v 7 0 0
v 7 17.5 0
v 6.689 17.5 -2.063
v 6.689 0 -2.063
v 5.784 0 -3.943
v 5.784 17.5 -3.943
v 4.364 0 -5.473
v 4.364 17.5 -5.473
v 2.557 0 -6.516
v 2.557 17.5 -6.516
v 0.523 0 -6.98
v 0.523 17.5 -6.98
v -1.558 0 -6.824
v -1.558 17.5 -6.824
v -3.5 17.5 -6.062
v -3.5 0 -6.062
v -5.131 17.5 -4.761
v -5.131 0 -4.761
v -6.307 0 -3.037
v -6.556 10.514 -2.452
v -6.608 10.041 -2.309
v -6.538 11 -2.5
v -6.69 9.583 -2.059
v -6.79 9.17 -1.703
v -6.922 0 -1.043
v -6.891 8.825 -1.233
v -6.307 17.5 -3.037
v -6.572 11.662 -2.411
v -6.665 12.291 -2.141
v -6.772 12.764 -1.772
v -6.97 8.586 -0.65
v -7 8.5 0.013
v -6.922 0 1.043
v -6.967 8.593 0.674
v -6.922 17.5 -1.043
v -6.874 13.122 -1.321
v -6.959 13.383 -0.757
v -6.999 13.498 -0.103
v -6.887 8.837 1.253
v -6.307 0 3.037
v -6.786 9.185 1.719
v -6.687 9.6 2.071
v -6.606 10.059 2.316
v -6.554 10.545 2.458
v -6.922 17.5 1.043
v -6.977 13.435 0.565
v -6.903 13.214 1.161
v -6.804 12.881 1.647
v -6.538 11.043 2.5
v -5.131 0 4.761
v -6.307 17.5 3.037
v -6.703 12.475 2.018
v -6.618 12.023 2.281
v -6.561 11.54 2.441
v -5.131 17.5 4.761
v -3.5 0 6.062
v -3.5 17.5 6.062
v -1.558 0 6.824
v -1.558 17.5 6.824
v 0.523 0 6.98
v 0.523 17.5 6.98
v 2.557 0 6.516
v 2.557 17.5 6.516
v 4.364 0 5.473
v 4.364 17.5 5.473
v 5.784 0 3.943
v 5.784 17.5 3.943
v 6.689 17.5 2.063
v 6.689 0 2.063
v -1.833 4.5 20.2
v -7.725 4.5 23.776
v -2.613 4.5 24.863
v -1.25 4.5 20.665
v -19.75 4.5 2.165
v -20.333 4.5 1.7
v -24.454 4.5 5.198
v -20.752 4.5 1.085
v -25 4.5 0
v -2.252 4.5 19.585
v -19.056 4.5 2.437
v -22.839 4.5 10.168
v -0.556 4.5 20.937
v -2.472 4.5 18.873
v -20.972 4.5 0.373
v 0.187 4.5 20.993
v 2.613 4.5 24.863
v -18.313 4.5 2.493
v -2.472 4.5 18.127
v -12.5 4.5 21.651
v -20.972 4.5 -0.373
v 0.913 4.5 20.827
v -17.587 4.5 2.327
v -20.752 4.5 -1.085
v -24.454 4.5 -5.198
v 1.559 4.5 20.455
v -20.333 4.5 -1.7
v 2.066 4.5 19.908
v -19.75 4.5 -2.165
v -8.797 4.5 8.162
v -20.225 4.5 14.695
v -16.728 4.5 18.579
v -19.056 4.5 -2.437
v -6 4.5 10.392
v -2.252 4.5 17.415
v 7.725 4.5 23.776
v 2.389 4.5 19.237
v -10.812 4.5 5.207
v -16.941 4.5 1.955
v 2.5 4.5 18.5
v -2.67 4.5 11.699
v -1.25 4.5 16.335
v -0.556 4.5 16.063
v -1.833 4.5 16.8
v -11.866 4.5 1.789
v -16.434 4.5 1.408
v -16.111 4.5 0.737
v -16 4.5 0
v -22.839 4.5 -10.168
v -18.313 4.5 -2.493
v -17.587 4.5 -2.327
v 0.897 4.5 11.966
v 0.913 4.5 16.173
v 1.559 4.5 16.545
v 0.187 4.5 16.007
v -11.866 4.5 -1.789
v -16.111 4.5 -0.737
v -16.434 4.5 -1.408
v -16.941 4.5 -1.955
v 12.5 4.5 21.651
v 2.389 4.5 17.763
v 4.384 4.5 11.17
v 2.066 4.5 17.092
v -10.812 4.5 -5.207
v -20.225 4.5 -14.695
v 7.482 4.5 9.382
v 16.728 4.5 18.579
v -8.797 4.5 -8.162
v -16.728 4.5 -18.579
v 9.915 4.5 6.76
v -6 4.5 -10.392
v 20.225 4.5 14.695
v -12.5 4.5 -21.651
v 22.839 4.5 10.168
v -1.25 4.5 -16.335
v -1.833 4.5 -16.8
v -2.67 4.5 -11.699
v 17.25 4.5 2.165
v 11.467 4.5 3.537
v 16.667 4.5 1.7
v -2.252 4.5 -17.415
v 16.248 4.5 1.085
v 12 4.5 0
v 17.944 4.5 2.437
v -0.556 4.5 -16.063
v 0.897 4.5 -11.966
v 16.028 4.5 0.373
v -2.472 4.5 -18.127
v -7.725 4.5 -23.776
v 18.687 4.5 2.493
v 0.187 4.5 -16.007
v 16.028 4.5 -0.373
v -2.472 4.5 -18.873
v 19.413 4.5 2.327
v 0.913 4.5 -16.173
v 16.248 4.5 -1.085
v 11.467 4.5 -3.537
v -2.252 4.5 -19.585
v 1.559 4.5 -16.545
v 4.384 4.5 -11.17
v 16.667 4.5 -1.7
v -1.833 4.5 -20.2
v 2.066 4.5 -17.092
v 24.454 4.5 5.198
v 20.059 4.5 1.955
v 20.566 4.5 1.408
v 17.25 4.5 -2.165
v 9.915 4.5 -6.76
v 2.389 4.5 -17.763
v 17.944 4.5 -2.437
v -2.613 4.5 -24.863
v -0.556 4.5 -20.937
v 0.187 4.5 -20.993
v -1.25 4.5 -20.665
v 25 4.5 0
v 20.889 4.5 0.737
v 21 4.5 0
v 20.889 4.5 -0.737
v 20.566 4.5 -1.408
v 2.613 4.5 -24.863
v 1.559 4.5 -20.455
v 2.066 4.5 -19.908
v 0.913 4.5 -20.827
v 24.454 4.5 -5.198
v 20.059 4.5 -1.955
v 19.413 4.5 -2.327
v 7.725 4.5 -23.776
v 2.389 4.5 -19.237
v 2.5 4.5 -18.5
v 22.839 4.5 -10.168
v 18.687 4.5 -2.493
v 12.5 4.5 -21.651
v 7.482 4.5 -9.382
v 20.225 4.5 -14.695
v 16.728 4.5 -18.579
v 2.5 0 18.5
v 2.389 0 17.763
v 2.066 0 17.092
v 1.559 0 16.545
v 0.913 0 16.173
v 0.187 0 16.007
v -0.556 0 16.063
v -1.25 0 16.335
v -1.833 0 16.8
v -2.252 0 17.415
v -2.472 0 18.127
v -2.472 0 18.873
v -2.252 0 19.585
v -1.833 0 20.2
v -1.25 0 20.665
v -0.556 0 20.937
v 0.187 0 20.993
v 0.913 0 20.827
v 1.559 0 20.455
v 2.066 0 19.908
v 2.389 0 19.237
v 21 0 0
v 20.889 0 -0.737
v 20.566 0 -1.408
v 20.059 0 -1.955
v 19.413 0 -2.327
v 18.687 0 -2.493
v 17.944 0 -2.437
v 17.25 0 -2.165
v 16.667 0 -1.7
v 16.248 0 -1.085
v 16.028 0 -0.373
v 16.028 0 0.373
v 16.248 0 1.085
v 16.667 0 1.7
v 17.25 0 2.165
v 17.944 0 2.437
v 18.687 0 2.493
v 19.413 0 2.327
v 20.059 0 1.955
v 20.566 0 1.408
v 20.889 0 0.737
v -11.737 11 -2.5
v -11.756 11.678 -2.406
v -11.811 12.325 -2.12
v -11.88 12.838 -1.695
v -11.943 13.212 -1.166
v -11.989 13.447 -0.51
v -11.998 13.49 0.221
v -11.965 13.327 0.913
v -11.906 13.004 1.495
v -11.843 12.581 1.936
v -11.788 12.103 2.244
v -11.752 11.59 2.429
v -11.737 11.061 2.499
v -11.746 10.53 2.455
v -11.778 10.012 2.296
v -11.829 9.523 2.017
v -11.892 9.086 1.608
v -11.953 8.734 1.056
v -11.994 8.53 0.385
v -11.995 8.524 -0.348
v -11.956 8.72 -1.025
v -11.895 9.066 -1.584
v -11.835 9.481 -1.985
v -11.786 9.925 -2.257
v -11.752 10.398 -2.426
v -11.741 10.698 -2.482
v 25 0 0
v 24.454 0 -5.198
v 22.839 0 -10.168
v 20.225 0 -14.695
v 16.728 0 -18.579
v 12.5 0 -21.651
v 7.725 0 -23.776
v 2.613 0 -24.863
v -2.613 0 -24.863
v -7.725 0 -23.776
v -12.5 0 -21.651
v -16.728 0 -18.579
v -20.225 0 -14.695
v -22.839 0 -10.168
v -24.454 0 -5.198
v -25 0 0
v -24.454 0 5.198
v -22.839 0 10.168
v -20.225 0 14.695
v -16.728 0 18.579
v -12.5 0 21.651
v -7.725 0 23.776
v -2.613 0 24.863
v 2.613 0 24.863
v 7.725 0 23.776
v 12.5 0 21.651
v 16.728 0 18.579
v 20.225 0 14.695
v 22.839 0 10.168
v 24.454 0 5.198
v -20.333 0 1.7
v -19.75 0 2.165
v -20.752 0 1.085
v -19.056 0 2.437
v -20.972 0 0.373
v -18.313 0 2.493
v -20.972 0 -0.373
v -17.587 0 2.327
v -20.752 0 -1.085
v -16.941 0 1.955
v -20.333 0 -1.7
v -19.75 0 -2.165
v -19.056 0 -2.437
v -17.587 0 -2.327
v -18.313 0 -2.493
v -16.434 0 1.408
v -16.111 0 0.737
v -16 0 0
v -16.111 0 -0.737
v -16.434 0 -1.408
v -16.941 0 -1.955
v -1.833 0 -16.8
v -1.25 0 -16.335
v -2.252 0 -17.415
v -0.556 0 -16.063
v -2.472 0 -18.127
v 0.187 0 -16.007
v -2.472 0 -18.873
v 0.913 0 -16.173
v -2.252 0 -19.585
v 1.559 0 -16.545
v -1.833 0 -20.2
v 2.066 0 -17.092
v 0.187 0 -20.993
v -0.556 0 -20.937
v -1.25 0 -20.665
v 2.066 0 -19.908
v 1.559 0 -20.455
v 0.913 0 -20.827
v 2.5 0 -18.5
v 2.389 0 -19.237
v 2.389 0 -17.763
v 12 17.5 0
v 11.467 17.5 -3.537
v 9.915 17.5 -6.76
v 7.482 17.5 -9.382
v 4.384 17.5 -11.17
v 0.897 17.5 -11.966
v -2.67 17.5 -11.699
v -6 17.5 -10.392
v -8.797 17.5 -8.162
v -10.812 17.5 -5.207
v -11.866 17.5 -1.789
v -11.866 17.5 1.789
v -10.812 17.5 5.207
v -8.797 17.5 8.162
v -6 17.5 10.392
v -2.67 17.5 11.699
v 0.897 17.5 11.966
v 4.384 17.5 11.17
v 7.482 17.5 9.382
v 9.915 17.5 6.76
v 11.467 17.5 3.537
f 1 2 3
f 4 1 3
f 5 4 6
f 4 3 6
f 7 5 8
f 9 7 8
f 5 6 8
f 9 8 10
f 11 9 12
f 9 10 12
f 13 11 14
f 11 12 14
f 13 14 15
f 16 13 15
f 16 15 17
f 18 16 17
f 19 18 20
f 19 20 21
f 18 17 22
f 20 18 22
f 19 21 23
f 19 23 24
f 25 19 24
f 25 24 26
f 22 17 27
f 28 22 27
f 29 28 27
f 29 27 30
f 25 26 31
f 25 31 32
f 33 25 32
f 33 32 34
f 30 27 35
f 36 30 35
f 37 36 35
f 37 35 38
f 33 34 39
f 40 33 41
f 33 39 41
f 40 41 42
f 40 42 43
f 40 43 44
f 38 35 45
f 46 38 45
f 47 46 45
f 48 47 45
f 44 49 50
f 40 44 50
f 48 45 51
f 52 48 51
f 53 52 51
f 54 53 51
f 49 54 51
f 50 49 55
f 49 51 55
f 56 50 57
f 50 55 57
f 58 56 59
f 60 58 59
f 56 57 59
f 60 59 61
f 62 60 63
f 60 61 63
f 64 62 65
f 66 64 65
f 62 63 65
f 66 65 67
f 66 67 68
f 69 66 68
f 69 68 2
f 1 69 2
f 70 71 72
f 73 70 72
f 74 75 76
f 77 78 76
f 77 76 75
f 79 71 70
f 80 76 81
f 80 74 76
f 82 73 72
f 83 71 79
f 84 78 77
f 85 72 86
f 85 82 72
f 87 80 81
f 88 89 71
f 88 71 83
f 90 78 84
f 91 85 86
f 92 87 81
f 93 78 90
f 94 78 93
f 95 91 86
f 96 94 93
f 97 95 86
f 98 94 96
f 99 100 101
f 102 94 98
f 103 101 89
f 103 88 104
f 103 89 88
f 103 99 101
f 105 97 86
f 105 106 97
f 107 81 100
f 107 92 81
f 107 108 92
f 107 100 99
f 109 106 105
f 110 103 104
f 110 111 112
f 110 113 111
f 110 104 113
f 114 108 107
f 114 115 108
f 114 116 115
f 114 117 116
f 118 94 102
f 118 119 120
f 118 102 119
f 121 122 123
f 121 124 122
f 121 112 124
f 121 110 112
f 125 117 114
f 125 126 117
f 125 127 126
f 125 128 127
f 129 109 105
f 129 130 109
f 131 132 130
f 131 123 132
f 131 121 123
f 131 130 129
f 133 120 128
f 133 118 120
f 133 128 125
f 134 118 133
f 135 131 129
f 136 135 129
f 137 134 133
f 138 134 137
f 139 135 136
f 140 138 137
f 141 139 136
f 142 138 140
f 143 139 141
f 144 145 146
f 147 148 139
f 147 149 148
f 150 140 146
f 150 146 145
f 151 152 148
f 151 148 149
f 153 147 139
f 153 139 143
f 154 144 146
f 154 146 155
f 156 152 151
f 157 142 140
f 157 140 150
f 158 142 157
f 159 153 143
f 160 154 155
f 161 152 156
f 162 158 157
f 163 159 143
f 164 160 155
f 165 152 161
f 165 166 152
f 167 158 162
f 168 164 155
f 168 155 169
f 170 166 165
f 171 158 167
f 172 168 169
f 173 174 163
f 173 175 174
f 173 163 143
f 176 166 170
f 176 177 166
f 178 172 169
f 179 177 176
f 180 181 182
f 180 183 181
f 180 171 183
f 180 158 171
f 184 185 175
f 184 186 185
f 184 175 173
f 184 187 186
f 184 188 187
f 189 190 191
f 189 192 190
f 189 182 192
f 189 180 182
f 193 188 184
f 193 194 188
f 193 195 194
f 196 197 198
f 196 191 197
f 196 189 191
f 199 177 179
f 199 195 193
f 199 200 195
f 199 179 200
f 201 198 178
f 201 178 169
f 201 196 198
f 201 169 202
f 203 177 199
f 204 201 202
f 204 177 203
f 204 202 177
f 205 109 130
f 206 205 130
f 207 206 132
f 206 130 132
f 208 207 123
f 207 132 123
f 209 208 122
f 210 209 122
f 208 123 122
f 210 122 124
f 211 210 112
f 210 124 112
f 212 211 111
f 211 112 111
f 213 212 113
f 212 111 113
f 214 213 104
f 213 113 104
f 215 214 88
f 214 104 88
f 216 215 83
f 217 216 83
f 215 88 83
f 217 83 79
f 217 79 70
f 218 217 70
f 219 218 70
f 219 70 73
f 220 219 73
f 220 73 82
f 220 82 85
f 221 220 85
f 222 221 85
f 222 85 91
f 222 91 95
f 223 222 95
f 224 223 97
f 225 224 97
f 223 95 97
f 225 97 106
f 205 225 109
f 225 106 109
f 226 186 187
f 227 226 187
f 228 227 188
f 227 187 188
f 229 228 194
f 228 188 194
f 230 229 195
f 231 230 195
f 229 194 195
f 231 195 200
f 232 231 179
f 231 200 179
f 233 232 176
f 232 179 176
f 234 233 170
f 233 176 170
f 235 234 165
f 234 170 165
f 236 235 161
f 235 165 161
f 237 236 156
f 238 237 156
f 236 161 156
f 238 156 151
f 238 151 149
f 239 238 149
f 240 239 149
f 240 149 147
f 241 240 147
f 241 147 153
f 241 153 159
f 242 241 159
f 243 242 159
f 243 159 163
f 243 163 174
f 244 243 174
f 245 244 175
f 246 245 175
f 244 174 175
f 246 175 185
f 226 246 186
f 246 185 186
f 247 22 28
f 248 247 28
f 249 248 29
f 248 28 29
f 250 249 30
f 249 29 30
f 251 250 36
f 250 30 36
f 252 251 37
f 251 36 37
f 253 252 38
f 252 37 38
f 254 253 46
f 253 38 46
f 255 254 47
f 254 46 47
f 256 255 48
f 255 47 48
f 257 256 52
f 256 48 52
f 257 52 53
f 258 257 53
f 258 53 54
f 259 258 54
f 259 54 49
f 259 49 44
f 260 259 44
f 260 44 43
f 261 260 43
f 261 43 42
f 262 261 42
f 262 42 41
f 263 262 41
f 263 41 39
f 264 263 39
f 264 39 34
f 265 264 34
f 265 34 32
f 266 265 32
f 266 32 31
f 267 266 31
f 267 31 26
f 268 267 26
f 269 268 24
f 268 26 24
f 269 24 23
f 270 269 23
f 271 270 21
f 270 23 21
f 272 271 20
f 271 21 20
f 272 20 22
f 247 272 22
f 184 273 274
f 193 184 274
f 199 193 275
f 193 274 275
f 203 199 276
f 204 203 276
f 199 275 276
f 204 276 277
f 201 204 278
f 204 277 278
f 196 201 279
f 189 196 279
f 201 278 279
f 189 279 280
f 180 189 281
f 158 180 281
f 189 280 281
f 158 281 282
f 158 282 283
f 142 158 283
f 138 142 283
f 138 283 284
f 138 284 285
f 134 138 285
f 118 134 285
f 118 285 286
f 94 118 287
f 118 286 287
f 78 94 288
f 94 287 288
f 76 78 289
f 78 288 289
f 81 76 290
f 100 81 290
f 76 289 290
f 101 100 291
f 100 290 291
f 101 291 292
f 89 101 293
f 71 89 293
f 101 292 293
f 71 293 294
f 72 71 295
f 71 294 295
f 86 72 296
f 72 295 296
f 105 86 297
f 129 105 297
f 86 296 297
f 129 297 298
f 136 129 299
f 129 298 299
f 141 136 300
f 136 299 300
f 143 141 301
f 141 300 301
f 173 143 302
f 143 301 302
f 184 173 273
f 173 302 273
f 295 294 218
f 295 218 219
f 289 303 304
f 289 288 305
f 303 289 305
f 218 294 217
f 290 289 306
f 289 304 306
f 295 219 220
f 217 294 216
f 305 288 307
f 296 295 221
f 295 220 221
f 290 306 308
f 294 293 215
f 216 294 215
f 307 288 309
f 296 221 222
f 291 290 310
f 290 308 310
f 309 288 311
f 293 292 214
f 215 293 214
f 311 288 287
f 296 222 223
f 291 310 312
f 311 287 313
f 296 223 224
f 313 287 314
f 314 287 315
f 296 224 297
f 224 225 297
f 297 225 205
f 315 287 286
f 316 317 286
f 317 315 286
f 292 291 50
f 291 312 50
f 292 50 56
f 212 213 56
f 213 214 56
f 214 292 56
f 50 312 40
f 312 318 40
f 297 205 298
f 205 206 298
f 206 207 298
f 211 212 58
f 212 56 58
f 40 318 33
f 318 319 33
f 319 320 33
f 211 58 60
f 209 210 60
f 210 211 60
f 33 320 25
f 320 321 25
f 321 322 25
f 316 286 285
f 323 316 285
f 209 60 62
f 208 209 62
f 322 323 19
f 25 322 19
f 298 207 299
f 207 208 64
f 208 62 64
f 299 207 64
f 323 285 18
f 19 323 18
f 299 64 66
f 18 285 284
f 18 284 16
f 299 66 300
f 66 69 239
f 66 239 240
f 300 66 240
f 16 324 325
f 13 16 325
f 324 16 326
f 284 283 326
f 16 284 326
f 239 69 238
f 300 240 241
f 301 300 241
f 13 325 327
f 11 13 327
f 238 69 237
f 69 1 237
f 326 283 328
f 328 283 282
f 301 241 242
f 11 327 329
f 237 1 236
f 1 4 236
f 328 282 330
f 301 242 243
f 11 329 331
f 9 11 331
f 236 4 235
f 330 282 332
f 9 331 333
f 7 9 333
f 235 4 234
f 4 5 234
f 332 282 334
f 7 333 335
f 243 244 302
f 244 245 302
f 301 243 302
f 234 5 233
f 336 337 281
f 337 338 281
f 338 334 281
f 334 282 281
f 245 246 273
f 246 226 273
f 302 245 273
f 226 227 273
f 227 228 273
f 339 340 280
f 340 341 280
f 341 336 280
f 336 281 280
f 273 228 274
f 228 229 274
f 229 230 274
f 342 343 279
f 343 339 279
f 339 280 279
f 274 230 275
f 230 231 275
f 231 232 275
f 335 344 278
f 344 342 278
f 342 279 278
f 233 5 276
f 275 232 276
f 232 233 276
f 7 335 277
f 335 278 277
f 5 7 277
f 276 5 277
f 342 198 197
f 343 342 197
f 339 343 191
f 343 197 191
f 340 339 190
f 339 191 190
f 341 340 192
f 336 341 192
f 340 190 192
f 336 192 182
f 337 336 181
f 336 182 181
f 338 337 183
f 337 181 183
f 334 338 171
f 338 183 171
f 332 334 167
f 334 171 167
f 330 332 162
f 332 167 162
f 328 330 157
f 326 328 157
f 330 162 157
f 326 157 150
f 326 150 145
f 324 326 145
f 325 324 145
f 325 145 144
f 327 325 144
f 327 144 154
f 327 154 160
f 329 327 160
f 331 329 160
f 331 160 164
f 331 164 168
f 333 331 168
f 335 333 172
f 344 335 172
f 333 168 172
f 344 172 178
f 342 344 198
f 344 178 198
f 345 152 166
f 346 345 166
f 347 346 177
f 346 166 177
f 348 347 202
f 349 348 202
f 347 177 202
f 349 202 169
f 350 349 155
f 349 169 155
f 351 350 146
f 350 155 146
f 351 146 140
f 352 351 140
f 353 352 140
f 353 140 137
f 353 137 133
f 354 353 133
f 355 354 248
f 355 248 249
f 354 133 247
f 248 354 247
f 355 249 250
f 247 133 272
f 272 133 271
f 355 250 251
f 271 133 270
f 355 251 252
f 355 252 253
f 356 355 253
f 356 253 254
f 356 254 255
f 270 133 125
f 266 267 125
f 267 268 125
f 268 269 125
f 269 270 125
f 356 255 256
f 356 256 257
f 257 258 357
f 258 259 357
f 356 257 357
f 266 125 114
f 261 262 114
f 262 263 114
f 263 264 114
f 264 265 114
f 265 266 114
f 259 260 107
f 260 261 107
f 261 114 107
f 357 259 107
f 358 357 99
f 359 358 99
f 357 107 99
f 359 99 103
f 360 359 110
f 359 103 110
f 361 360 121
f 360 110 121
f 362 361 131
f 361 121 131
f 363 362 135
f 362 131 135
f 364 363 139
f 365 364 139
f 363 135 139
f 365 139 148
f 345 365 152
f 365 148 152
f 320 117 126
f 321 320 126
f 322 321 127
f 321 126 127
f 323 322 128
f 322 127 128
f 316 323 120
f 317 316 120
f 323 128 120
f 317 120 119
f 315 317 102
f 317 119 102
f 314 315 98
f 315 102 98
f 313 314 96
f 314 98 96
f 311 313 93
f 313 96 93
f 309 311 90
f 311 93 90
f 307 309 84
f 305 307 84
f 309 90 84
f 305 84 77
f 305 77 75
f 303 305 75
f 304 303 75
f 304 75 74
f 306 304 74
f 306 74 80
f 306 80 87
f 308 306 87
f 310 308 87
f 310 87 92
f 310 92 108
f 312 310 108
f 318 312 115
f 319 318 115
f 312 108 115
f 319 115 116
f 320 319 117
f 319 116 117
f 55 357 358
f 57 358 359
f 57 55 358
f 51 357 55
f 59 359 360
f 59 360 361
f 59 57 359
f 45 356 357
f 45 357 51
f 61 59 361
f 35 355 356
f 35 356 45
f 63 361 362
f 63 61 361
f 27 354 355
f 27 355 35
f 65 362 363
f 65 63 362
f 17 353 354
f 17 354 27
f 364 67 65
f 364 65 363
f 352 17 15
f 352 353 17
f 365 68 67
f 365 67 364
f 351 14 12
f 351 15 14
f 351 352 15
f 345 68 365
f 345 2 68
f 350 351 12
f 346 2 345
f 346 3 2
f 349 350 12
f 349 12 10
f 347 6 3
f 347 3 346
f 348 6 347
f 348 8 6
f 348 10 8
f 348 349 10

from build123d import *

# Parameters (mm, degrees)
SKETCH1_R           = 25
BOSS_EXTRUDE1_DEPTH = 4.5
SKETCH2_R           = 12
BOSS_EXTRUDE2_DEPTH = 13
SKETCH3_R           = 7
CUT_EXTRUDE1_DEPTH  = 17.5
SKETCH4_R           = 2.5
CUT_EXTRUDE2_DEPTH  = 4.5
SKETCH5_R           = 2.5
CUT_EXTRUDE3_DEPTH  = 25


with BuildPart() as part:
    # Sketch1 → Boss-Extrude1 (new body)
    with BuildSketch(Plane(origin=(0, 0, 0), x_dir=(1, 0, 0), z_dir=(0, 1, 0))):
        Circle(SKETCH1_R)
    extrude(amount=BOSS_EXTRUDE1_DEPTH)

    # Sketch2 → Boss-Extrude2 (add)
    with BuildSketch(Plane(origin=(0, 4.5, 0), x_dir=(1, 0, 0), z_dir=(0, 1, 0))):
        Circle(SKETCH2_R)
    extrude(amount=BOSS_EXTRUDE2_DEPTH)

    # Sketch3 → Cut-Extrude1 (cut)
    with BuildSketch(Plane(origin=(0, 17.5, 0), x_dir=(1, 0, 0), z_dir=(0, 1, 0))):
        Circle(SKETCH3_R)
    extrude(amount=-CUT_EXTRUDE1_DEPTH, mode=Mode.SUBTRACT)

    # Sketch4 → Cut-Extrude2 (cut)
    with BuildSketch(Plane(origin=(0, 4.5, 0), x_dir=(1, 0, 0), z_dir=(0, 1, 0))):
        with Locations((-18.5, 0)):
            Circle(SKETCH4_R)
        with Locations((0, 18.5)):
            Circle(SKETCH4_R)
        with Locations((18.5, 0)):
            Circle(SKETCH4_R)
        with Locations((0, -18.5)):
            Circle(SKETCH4_R)
    extrude(amount=-CUT_EXTRUDE2_DEPTH, mode=Mode.SUBTRACT)

    # Sketch5 → Cut-Extrude3 (cut)
    with BuildSketch(Plane(origin=(0, 0, 0), x_dir=(0, 0, -1), z_dir=(1, 0, 0))):
        with Locations((0, 11)):
            Circle(SKETCH5_R)
    extrude(amount=-CUT_EXTRUDE3_DEPTH, mode=Mode.SUBTRACT)


solid = part.part
